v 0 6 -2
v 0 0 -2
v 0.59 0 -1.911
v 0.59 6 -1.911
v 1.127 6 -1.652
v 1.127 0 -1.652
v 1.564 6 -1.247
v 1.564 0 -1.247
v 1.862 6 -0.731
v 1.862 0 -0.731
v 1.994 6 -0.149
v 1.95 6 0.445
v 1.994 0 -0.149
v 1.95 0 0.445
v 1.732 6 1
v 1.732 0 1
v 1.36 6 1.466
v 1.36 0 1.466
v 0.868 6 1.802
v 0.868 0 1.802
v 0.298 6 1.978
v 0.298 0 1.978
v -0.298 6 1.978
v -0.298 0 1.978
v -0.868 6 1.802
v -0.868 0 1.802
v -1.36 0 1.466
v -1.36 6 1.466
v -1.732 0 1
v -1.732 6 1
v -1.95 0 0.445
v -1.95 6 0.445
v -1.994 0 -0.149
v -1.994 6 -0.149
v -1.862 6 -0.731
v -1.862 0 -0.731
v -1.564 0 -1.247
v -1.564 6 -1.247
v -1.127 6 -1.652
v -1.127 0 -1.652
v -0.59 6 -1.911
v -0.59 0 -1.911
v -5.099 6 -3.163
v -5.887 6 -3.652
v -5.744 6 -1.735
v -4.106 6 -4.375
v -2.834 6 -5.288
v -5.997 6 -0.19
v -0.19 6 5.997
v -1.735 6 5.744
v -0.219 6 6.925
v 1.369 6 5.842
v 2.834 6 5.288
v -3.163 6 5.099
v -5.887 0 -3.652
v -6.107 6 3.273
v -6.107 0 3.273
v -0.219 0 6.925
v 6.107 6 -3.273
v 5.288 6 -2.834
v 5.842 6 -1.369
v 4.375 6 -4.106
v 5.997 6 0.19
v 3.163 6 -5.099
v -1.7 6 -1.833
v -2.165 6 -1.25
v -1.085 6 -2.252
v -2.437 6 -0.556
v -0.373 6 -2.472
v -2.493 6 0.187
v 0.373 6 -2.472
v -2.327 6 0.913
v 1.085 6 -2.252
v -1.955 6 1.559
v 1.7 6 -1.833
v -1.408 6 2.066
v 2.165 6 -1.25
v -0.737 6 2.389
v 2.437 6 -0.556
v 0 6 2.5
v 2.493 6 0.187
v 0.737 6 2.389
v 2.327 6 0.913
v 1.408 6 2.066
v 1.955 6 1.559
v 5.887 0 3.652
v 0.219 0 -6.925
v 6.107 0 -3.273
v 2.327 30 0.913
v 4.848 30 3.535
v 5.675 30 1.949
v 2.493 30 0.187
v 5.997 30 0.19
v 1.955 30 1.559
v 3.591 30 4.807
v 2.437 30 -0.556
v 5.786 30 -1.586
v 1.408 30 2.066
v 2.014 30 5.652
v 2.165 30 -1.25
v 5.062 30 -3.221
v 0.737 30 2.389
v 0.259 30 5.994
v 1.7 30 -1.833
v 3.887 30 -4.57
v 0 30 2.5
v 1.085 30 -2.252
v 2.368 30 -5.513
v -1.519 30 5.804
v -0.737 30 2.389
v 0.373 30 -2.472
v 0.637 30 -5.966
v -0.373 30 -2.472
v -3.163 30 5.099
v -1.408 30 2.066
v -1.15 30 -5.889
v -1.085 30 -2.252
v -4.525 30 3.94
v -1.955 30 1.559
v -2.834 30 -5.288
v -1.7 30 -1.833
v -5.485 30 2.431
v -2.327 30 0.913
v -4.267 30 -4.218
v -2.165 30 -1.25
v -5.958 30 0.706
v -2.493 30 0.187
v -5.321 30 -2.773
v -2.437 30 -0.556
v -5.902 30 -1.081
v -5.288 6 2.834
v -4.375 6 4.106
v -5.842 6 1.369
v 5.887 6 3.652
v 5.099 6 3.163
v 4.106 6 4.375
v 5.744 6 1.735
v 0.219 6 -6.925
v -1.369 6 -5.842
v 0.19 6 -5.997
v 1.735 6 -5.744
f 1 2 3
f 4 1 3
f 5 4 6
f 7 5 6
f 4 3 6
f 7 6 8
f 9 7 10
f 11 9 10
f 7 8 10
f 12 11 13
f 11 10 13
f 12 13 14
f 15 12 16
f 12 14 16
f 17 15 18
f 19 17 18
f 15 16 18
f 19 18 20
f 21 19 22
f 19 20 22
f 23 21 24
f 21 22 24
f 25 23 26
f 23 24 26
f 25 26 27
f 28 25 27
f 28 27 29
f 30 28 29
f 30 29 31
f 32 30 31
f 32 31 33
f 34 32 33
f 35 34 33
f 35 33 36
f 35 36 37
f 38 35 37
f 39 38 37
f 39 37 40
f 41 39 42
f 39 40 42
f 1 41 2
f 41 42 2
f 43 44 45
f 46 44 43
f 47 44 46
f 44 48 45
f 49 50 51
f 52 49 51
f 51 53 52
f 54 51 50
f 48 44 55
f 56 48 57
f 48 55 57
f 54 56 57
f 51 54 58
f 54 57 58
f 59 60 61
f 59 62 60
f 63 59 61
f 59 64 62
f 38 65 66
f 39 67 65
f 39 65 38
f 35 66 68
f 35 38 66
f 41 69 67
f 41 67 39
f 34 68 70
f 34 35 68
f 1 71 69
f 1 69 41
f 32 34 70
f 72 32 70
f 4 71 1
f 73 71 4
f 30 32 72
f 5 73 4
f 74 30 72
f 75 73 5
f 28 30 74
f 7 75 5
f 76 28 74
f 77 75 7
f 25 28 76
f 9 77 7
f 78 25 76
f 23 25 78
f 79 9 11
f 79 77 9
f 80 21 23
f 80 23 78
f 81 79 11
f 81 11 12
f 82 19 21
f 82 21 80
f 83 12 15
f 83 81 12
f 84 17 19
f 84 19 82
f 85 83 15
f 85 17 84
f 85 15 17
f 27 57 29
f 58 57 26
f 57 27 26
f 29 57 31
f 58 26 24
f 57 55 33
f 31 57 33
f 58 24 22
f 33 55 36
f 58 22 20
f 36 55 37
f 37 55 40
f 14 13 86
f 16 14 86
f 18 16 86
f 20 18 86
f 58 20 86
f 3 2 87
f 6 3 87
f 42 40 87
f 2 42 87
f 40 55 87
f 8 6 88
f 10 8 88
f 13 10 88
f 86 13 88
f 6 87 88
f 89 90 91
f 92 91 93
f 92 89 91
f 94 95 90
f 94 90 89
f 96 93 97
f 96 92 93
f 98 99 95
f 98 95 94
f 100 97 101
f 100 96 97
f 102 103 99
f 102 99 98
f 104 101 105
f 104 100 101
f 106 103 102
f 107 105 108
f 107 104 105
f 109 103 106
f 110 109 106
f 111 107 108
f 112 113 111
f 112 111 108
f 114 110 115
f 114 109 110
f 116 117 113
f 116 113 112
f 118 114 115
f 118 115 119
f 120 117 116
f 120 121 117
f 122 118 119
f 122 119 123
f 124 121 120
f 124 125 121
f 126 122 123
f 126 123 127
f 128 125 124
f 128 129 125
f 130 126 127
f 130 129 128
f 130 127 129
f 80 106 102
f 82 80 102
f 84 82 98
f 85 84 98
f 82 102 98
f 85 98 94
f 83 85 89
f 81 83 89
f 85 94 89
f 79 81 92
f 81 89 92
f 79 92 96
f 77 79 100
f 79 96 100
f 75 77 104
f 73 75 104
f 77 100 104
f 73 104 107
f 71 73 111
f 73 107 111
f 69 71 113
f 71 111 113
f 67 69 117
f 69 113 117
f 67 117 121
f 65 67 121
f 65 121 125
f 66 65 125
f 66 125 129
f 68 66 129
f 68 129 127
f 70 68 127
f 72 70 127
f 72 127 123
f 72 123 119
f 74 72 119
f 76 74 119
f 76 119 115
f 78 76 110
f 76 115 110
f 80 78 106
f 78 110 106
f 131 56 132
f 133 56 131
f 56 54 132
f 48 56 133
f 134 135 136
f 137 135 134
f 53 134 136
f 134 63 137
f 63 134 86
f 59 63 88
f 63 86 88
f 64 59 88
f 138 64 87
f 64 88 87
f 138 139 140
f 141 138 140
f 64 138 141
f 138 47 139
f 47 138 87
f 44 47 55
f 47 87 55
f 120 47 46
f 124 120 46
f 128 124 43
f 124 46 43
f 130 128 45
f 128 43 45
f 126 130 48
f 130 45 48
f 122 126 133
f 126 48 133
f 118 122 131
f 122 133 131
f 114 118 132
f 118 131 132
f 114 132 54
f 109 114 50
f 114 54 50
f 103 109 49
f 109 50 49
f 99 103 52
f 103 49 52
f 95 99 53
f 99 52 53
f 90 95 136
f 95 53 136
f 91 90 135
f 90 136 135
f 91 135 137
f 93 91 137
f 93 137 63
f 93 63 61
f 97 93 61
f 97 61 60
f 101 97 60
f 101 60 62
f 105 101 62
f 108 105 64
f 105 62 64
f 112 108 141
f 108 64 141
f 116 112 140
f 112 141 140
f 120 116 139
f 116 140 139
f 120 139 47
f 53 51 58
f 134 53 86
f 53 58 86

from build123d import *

# Parameters (mm, degrees)
EXTRUDE_1_DEPTH     = 6
SKETCH_2_R          = 6
EXTRUDE_2_DEPTH     = 24
SKETCH_3_R          = 2.5
CUT_EXTRUDE_1_DEPTH = 24
SKETCH_4_R          = 2
CUT_EXTRUDE_2_DEPTH = 6


with BuildPart() as part:
    # 草图1 → 凸台-拉伸1 (new body)
    with BuildSketch(Plane(origin=(0, 0, 0), x_dir=(1, 0, 0), z_dir=(0, 1, 0))):
        Polygon((5.88746988, -3.652081381), (6.106530193, 3.27265779), (0.219060313, 6.92473917), (-5.88746988, 3.652081381), (-6.106530193, -3.27265779), (-0.219060313, -6.92473917), align=None)
    extrude(amount=EXTRUDE_1_DEPTH)

    # 草图2 → 凸台-拉伸2 (add)
    with BuildSketch(Plane(origin=(0, 6, 0), x_dir=(1, 0, 0), z_dir=(0, 1, 0))):
        with Locations(Location((0, 0, 0), (0, 0, 118.188083805))):
            Circle(SKETCH_2_R)
    extrude(amount=EXTRUDE_2_DEPTH)

    # 草图3 → 切除-拉伸1 (cut)
    with BuildSketch(Plane(origin=(0, 30, 0), x_dir=(1, 0, 0), z_dir=(0, 1, 0))):
        with Locations(Location((0, 0, 0), (0, 0, 270))):
            Circle(SKETCH_3_R)
    extrude(amount=-CUT_EXTRUDE_1_DEPTH, mode=Mode.SUBTRACT)

    # 草图4 → 切除-拉伸2 (cut)
    with BuildSketch(Plane.XZ):
        with Locations(Location((0, 0, 0), (0, 0, 270))):
            Circle(SKETCH_4_R)
    extrude(amount=-CUT_EXTRUDE_2_DEPTH, mode=Mode.SUBTRACT)


solid = part.part
